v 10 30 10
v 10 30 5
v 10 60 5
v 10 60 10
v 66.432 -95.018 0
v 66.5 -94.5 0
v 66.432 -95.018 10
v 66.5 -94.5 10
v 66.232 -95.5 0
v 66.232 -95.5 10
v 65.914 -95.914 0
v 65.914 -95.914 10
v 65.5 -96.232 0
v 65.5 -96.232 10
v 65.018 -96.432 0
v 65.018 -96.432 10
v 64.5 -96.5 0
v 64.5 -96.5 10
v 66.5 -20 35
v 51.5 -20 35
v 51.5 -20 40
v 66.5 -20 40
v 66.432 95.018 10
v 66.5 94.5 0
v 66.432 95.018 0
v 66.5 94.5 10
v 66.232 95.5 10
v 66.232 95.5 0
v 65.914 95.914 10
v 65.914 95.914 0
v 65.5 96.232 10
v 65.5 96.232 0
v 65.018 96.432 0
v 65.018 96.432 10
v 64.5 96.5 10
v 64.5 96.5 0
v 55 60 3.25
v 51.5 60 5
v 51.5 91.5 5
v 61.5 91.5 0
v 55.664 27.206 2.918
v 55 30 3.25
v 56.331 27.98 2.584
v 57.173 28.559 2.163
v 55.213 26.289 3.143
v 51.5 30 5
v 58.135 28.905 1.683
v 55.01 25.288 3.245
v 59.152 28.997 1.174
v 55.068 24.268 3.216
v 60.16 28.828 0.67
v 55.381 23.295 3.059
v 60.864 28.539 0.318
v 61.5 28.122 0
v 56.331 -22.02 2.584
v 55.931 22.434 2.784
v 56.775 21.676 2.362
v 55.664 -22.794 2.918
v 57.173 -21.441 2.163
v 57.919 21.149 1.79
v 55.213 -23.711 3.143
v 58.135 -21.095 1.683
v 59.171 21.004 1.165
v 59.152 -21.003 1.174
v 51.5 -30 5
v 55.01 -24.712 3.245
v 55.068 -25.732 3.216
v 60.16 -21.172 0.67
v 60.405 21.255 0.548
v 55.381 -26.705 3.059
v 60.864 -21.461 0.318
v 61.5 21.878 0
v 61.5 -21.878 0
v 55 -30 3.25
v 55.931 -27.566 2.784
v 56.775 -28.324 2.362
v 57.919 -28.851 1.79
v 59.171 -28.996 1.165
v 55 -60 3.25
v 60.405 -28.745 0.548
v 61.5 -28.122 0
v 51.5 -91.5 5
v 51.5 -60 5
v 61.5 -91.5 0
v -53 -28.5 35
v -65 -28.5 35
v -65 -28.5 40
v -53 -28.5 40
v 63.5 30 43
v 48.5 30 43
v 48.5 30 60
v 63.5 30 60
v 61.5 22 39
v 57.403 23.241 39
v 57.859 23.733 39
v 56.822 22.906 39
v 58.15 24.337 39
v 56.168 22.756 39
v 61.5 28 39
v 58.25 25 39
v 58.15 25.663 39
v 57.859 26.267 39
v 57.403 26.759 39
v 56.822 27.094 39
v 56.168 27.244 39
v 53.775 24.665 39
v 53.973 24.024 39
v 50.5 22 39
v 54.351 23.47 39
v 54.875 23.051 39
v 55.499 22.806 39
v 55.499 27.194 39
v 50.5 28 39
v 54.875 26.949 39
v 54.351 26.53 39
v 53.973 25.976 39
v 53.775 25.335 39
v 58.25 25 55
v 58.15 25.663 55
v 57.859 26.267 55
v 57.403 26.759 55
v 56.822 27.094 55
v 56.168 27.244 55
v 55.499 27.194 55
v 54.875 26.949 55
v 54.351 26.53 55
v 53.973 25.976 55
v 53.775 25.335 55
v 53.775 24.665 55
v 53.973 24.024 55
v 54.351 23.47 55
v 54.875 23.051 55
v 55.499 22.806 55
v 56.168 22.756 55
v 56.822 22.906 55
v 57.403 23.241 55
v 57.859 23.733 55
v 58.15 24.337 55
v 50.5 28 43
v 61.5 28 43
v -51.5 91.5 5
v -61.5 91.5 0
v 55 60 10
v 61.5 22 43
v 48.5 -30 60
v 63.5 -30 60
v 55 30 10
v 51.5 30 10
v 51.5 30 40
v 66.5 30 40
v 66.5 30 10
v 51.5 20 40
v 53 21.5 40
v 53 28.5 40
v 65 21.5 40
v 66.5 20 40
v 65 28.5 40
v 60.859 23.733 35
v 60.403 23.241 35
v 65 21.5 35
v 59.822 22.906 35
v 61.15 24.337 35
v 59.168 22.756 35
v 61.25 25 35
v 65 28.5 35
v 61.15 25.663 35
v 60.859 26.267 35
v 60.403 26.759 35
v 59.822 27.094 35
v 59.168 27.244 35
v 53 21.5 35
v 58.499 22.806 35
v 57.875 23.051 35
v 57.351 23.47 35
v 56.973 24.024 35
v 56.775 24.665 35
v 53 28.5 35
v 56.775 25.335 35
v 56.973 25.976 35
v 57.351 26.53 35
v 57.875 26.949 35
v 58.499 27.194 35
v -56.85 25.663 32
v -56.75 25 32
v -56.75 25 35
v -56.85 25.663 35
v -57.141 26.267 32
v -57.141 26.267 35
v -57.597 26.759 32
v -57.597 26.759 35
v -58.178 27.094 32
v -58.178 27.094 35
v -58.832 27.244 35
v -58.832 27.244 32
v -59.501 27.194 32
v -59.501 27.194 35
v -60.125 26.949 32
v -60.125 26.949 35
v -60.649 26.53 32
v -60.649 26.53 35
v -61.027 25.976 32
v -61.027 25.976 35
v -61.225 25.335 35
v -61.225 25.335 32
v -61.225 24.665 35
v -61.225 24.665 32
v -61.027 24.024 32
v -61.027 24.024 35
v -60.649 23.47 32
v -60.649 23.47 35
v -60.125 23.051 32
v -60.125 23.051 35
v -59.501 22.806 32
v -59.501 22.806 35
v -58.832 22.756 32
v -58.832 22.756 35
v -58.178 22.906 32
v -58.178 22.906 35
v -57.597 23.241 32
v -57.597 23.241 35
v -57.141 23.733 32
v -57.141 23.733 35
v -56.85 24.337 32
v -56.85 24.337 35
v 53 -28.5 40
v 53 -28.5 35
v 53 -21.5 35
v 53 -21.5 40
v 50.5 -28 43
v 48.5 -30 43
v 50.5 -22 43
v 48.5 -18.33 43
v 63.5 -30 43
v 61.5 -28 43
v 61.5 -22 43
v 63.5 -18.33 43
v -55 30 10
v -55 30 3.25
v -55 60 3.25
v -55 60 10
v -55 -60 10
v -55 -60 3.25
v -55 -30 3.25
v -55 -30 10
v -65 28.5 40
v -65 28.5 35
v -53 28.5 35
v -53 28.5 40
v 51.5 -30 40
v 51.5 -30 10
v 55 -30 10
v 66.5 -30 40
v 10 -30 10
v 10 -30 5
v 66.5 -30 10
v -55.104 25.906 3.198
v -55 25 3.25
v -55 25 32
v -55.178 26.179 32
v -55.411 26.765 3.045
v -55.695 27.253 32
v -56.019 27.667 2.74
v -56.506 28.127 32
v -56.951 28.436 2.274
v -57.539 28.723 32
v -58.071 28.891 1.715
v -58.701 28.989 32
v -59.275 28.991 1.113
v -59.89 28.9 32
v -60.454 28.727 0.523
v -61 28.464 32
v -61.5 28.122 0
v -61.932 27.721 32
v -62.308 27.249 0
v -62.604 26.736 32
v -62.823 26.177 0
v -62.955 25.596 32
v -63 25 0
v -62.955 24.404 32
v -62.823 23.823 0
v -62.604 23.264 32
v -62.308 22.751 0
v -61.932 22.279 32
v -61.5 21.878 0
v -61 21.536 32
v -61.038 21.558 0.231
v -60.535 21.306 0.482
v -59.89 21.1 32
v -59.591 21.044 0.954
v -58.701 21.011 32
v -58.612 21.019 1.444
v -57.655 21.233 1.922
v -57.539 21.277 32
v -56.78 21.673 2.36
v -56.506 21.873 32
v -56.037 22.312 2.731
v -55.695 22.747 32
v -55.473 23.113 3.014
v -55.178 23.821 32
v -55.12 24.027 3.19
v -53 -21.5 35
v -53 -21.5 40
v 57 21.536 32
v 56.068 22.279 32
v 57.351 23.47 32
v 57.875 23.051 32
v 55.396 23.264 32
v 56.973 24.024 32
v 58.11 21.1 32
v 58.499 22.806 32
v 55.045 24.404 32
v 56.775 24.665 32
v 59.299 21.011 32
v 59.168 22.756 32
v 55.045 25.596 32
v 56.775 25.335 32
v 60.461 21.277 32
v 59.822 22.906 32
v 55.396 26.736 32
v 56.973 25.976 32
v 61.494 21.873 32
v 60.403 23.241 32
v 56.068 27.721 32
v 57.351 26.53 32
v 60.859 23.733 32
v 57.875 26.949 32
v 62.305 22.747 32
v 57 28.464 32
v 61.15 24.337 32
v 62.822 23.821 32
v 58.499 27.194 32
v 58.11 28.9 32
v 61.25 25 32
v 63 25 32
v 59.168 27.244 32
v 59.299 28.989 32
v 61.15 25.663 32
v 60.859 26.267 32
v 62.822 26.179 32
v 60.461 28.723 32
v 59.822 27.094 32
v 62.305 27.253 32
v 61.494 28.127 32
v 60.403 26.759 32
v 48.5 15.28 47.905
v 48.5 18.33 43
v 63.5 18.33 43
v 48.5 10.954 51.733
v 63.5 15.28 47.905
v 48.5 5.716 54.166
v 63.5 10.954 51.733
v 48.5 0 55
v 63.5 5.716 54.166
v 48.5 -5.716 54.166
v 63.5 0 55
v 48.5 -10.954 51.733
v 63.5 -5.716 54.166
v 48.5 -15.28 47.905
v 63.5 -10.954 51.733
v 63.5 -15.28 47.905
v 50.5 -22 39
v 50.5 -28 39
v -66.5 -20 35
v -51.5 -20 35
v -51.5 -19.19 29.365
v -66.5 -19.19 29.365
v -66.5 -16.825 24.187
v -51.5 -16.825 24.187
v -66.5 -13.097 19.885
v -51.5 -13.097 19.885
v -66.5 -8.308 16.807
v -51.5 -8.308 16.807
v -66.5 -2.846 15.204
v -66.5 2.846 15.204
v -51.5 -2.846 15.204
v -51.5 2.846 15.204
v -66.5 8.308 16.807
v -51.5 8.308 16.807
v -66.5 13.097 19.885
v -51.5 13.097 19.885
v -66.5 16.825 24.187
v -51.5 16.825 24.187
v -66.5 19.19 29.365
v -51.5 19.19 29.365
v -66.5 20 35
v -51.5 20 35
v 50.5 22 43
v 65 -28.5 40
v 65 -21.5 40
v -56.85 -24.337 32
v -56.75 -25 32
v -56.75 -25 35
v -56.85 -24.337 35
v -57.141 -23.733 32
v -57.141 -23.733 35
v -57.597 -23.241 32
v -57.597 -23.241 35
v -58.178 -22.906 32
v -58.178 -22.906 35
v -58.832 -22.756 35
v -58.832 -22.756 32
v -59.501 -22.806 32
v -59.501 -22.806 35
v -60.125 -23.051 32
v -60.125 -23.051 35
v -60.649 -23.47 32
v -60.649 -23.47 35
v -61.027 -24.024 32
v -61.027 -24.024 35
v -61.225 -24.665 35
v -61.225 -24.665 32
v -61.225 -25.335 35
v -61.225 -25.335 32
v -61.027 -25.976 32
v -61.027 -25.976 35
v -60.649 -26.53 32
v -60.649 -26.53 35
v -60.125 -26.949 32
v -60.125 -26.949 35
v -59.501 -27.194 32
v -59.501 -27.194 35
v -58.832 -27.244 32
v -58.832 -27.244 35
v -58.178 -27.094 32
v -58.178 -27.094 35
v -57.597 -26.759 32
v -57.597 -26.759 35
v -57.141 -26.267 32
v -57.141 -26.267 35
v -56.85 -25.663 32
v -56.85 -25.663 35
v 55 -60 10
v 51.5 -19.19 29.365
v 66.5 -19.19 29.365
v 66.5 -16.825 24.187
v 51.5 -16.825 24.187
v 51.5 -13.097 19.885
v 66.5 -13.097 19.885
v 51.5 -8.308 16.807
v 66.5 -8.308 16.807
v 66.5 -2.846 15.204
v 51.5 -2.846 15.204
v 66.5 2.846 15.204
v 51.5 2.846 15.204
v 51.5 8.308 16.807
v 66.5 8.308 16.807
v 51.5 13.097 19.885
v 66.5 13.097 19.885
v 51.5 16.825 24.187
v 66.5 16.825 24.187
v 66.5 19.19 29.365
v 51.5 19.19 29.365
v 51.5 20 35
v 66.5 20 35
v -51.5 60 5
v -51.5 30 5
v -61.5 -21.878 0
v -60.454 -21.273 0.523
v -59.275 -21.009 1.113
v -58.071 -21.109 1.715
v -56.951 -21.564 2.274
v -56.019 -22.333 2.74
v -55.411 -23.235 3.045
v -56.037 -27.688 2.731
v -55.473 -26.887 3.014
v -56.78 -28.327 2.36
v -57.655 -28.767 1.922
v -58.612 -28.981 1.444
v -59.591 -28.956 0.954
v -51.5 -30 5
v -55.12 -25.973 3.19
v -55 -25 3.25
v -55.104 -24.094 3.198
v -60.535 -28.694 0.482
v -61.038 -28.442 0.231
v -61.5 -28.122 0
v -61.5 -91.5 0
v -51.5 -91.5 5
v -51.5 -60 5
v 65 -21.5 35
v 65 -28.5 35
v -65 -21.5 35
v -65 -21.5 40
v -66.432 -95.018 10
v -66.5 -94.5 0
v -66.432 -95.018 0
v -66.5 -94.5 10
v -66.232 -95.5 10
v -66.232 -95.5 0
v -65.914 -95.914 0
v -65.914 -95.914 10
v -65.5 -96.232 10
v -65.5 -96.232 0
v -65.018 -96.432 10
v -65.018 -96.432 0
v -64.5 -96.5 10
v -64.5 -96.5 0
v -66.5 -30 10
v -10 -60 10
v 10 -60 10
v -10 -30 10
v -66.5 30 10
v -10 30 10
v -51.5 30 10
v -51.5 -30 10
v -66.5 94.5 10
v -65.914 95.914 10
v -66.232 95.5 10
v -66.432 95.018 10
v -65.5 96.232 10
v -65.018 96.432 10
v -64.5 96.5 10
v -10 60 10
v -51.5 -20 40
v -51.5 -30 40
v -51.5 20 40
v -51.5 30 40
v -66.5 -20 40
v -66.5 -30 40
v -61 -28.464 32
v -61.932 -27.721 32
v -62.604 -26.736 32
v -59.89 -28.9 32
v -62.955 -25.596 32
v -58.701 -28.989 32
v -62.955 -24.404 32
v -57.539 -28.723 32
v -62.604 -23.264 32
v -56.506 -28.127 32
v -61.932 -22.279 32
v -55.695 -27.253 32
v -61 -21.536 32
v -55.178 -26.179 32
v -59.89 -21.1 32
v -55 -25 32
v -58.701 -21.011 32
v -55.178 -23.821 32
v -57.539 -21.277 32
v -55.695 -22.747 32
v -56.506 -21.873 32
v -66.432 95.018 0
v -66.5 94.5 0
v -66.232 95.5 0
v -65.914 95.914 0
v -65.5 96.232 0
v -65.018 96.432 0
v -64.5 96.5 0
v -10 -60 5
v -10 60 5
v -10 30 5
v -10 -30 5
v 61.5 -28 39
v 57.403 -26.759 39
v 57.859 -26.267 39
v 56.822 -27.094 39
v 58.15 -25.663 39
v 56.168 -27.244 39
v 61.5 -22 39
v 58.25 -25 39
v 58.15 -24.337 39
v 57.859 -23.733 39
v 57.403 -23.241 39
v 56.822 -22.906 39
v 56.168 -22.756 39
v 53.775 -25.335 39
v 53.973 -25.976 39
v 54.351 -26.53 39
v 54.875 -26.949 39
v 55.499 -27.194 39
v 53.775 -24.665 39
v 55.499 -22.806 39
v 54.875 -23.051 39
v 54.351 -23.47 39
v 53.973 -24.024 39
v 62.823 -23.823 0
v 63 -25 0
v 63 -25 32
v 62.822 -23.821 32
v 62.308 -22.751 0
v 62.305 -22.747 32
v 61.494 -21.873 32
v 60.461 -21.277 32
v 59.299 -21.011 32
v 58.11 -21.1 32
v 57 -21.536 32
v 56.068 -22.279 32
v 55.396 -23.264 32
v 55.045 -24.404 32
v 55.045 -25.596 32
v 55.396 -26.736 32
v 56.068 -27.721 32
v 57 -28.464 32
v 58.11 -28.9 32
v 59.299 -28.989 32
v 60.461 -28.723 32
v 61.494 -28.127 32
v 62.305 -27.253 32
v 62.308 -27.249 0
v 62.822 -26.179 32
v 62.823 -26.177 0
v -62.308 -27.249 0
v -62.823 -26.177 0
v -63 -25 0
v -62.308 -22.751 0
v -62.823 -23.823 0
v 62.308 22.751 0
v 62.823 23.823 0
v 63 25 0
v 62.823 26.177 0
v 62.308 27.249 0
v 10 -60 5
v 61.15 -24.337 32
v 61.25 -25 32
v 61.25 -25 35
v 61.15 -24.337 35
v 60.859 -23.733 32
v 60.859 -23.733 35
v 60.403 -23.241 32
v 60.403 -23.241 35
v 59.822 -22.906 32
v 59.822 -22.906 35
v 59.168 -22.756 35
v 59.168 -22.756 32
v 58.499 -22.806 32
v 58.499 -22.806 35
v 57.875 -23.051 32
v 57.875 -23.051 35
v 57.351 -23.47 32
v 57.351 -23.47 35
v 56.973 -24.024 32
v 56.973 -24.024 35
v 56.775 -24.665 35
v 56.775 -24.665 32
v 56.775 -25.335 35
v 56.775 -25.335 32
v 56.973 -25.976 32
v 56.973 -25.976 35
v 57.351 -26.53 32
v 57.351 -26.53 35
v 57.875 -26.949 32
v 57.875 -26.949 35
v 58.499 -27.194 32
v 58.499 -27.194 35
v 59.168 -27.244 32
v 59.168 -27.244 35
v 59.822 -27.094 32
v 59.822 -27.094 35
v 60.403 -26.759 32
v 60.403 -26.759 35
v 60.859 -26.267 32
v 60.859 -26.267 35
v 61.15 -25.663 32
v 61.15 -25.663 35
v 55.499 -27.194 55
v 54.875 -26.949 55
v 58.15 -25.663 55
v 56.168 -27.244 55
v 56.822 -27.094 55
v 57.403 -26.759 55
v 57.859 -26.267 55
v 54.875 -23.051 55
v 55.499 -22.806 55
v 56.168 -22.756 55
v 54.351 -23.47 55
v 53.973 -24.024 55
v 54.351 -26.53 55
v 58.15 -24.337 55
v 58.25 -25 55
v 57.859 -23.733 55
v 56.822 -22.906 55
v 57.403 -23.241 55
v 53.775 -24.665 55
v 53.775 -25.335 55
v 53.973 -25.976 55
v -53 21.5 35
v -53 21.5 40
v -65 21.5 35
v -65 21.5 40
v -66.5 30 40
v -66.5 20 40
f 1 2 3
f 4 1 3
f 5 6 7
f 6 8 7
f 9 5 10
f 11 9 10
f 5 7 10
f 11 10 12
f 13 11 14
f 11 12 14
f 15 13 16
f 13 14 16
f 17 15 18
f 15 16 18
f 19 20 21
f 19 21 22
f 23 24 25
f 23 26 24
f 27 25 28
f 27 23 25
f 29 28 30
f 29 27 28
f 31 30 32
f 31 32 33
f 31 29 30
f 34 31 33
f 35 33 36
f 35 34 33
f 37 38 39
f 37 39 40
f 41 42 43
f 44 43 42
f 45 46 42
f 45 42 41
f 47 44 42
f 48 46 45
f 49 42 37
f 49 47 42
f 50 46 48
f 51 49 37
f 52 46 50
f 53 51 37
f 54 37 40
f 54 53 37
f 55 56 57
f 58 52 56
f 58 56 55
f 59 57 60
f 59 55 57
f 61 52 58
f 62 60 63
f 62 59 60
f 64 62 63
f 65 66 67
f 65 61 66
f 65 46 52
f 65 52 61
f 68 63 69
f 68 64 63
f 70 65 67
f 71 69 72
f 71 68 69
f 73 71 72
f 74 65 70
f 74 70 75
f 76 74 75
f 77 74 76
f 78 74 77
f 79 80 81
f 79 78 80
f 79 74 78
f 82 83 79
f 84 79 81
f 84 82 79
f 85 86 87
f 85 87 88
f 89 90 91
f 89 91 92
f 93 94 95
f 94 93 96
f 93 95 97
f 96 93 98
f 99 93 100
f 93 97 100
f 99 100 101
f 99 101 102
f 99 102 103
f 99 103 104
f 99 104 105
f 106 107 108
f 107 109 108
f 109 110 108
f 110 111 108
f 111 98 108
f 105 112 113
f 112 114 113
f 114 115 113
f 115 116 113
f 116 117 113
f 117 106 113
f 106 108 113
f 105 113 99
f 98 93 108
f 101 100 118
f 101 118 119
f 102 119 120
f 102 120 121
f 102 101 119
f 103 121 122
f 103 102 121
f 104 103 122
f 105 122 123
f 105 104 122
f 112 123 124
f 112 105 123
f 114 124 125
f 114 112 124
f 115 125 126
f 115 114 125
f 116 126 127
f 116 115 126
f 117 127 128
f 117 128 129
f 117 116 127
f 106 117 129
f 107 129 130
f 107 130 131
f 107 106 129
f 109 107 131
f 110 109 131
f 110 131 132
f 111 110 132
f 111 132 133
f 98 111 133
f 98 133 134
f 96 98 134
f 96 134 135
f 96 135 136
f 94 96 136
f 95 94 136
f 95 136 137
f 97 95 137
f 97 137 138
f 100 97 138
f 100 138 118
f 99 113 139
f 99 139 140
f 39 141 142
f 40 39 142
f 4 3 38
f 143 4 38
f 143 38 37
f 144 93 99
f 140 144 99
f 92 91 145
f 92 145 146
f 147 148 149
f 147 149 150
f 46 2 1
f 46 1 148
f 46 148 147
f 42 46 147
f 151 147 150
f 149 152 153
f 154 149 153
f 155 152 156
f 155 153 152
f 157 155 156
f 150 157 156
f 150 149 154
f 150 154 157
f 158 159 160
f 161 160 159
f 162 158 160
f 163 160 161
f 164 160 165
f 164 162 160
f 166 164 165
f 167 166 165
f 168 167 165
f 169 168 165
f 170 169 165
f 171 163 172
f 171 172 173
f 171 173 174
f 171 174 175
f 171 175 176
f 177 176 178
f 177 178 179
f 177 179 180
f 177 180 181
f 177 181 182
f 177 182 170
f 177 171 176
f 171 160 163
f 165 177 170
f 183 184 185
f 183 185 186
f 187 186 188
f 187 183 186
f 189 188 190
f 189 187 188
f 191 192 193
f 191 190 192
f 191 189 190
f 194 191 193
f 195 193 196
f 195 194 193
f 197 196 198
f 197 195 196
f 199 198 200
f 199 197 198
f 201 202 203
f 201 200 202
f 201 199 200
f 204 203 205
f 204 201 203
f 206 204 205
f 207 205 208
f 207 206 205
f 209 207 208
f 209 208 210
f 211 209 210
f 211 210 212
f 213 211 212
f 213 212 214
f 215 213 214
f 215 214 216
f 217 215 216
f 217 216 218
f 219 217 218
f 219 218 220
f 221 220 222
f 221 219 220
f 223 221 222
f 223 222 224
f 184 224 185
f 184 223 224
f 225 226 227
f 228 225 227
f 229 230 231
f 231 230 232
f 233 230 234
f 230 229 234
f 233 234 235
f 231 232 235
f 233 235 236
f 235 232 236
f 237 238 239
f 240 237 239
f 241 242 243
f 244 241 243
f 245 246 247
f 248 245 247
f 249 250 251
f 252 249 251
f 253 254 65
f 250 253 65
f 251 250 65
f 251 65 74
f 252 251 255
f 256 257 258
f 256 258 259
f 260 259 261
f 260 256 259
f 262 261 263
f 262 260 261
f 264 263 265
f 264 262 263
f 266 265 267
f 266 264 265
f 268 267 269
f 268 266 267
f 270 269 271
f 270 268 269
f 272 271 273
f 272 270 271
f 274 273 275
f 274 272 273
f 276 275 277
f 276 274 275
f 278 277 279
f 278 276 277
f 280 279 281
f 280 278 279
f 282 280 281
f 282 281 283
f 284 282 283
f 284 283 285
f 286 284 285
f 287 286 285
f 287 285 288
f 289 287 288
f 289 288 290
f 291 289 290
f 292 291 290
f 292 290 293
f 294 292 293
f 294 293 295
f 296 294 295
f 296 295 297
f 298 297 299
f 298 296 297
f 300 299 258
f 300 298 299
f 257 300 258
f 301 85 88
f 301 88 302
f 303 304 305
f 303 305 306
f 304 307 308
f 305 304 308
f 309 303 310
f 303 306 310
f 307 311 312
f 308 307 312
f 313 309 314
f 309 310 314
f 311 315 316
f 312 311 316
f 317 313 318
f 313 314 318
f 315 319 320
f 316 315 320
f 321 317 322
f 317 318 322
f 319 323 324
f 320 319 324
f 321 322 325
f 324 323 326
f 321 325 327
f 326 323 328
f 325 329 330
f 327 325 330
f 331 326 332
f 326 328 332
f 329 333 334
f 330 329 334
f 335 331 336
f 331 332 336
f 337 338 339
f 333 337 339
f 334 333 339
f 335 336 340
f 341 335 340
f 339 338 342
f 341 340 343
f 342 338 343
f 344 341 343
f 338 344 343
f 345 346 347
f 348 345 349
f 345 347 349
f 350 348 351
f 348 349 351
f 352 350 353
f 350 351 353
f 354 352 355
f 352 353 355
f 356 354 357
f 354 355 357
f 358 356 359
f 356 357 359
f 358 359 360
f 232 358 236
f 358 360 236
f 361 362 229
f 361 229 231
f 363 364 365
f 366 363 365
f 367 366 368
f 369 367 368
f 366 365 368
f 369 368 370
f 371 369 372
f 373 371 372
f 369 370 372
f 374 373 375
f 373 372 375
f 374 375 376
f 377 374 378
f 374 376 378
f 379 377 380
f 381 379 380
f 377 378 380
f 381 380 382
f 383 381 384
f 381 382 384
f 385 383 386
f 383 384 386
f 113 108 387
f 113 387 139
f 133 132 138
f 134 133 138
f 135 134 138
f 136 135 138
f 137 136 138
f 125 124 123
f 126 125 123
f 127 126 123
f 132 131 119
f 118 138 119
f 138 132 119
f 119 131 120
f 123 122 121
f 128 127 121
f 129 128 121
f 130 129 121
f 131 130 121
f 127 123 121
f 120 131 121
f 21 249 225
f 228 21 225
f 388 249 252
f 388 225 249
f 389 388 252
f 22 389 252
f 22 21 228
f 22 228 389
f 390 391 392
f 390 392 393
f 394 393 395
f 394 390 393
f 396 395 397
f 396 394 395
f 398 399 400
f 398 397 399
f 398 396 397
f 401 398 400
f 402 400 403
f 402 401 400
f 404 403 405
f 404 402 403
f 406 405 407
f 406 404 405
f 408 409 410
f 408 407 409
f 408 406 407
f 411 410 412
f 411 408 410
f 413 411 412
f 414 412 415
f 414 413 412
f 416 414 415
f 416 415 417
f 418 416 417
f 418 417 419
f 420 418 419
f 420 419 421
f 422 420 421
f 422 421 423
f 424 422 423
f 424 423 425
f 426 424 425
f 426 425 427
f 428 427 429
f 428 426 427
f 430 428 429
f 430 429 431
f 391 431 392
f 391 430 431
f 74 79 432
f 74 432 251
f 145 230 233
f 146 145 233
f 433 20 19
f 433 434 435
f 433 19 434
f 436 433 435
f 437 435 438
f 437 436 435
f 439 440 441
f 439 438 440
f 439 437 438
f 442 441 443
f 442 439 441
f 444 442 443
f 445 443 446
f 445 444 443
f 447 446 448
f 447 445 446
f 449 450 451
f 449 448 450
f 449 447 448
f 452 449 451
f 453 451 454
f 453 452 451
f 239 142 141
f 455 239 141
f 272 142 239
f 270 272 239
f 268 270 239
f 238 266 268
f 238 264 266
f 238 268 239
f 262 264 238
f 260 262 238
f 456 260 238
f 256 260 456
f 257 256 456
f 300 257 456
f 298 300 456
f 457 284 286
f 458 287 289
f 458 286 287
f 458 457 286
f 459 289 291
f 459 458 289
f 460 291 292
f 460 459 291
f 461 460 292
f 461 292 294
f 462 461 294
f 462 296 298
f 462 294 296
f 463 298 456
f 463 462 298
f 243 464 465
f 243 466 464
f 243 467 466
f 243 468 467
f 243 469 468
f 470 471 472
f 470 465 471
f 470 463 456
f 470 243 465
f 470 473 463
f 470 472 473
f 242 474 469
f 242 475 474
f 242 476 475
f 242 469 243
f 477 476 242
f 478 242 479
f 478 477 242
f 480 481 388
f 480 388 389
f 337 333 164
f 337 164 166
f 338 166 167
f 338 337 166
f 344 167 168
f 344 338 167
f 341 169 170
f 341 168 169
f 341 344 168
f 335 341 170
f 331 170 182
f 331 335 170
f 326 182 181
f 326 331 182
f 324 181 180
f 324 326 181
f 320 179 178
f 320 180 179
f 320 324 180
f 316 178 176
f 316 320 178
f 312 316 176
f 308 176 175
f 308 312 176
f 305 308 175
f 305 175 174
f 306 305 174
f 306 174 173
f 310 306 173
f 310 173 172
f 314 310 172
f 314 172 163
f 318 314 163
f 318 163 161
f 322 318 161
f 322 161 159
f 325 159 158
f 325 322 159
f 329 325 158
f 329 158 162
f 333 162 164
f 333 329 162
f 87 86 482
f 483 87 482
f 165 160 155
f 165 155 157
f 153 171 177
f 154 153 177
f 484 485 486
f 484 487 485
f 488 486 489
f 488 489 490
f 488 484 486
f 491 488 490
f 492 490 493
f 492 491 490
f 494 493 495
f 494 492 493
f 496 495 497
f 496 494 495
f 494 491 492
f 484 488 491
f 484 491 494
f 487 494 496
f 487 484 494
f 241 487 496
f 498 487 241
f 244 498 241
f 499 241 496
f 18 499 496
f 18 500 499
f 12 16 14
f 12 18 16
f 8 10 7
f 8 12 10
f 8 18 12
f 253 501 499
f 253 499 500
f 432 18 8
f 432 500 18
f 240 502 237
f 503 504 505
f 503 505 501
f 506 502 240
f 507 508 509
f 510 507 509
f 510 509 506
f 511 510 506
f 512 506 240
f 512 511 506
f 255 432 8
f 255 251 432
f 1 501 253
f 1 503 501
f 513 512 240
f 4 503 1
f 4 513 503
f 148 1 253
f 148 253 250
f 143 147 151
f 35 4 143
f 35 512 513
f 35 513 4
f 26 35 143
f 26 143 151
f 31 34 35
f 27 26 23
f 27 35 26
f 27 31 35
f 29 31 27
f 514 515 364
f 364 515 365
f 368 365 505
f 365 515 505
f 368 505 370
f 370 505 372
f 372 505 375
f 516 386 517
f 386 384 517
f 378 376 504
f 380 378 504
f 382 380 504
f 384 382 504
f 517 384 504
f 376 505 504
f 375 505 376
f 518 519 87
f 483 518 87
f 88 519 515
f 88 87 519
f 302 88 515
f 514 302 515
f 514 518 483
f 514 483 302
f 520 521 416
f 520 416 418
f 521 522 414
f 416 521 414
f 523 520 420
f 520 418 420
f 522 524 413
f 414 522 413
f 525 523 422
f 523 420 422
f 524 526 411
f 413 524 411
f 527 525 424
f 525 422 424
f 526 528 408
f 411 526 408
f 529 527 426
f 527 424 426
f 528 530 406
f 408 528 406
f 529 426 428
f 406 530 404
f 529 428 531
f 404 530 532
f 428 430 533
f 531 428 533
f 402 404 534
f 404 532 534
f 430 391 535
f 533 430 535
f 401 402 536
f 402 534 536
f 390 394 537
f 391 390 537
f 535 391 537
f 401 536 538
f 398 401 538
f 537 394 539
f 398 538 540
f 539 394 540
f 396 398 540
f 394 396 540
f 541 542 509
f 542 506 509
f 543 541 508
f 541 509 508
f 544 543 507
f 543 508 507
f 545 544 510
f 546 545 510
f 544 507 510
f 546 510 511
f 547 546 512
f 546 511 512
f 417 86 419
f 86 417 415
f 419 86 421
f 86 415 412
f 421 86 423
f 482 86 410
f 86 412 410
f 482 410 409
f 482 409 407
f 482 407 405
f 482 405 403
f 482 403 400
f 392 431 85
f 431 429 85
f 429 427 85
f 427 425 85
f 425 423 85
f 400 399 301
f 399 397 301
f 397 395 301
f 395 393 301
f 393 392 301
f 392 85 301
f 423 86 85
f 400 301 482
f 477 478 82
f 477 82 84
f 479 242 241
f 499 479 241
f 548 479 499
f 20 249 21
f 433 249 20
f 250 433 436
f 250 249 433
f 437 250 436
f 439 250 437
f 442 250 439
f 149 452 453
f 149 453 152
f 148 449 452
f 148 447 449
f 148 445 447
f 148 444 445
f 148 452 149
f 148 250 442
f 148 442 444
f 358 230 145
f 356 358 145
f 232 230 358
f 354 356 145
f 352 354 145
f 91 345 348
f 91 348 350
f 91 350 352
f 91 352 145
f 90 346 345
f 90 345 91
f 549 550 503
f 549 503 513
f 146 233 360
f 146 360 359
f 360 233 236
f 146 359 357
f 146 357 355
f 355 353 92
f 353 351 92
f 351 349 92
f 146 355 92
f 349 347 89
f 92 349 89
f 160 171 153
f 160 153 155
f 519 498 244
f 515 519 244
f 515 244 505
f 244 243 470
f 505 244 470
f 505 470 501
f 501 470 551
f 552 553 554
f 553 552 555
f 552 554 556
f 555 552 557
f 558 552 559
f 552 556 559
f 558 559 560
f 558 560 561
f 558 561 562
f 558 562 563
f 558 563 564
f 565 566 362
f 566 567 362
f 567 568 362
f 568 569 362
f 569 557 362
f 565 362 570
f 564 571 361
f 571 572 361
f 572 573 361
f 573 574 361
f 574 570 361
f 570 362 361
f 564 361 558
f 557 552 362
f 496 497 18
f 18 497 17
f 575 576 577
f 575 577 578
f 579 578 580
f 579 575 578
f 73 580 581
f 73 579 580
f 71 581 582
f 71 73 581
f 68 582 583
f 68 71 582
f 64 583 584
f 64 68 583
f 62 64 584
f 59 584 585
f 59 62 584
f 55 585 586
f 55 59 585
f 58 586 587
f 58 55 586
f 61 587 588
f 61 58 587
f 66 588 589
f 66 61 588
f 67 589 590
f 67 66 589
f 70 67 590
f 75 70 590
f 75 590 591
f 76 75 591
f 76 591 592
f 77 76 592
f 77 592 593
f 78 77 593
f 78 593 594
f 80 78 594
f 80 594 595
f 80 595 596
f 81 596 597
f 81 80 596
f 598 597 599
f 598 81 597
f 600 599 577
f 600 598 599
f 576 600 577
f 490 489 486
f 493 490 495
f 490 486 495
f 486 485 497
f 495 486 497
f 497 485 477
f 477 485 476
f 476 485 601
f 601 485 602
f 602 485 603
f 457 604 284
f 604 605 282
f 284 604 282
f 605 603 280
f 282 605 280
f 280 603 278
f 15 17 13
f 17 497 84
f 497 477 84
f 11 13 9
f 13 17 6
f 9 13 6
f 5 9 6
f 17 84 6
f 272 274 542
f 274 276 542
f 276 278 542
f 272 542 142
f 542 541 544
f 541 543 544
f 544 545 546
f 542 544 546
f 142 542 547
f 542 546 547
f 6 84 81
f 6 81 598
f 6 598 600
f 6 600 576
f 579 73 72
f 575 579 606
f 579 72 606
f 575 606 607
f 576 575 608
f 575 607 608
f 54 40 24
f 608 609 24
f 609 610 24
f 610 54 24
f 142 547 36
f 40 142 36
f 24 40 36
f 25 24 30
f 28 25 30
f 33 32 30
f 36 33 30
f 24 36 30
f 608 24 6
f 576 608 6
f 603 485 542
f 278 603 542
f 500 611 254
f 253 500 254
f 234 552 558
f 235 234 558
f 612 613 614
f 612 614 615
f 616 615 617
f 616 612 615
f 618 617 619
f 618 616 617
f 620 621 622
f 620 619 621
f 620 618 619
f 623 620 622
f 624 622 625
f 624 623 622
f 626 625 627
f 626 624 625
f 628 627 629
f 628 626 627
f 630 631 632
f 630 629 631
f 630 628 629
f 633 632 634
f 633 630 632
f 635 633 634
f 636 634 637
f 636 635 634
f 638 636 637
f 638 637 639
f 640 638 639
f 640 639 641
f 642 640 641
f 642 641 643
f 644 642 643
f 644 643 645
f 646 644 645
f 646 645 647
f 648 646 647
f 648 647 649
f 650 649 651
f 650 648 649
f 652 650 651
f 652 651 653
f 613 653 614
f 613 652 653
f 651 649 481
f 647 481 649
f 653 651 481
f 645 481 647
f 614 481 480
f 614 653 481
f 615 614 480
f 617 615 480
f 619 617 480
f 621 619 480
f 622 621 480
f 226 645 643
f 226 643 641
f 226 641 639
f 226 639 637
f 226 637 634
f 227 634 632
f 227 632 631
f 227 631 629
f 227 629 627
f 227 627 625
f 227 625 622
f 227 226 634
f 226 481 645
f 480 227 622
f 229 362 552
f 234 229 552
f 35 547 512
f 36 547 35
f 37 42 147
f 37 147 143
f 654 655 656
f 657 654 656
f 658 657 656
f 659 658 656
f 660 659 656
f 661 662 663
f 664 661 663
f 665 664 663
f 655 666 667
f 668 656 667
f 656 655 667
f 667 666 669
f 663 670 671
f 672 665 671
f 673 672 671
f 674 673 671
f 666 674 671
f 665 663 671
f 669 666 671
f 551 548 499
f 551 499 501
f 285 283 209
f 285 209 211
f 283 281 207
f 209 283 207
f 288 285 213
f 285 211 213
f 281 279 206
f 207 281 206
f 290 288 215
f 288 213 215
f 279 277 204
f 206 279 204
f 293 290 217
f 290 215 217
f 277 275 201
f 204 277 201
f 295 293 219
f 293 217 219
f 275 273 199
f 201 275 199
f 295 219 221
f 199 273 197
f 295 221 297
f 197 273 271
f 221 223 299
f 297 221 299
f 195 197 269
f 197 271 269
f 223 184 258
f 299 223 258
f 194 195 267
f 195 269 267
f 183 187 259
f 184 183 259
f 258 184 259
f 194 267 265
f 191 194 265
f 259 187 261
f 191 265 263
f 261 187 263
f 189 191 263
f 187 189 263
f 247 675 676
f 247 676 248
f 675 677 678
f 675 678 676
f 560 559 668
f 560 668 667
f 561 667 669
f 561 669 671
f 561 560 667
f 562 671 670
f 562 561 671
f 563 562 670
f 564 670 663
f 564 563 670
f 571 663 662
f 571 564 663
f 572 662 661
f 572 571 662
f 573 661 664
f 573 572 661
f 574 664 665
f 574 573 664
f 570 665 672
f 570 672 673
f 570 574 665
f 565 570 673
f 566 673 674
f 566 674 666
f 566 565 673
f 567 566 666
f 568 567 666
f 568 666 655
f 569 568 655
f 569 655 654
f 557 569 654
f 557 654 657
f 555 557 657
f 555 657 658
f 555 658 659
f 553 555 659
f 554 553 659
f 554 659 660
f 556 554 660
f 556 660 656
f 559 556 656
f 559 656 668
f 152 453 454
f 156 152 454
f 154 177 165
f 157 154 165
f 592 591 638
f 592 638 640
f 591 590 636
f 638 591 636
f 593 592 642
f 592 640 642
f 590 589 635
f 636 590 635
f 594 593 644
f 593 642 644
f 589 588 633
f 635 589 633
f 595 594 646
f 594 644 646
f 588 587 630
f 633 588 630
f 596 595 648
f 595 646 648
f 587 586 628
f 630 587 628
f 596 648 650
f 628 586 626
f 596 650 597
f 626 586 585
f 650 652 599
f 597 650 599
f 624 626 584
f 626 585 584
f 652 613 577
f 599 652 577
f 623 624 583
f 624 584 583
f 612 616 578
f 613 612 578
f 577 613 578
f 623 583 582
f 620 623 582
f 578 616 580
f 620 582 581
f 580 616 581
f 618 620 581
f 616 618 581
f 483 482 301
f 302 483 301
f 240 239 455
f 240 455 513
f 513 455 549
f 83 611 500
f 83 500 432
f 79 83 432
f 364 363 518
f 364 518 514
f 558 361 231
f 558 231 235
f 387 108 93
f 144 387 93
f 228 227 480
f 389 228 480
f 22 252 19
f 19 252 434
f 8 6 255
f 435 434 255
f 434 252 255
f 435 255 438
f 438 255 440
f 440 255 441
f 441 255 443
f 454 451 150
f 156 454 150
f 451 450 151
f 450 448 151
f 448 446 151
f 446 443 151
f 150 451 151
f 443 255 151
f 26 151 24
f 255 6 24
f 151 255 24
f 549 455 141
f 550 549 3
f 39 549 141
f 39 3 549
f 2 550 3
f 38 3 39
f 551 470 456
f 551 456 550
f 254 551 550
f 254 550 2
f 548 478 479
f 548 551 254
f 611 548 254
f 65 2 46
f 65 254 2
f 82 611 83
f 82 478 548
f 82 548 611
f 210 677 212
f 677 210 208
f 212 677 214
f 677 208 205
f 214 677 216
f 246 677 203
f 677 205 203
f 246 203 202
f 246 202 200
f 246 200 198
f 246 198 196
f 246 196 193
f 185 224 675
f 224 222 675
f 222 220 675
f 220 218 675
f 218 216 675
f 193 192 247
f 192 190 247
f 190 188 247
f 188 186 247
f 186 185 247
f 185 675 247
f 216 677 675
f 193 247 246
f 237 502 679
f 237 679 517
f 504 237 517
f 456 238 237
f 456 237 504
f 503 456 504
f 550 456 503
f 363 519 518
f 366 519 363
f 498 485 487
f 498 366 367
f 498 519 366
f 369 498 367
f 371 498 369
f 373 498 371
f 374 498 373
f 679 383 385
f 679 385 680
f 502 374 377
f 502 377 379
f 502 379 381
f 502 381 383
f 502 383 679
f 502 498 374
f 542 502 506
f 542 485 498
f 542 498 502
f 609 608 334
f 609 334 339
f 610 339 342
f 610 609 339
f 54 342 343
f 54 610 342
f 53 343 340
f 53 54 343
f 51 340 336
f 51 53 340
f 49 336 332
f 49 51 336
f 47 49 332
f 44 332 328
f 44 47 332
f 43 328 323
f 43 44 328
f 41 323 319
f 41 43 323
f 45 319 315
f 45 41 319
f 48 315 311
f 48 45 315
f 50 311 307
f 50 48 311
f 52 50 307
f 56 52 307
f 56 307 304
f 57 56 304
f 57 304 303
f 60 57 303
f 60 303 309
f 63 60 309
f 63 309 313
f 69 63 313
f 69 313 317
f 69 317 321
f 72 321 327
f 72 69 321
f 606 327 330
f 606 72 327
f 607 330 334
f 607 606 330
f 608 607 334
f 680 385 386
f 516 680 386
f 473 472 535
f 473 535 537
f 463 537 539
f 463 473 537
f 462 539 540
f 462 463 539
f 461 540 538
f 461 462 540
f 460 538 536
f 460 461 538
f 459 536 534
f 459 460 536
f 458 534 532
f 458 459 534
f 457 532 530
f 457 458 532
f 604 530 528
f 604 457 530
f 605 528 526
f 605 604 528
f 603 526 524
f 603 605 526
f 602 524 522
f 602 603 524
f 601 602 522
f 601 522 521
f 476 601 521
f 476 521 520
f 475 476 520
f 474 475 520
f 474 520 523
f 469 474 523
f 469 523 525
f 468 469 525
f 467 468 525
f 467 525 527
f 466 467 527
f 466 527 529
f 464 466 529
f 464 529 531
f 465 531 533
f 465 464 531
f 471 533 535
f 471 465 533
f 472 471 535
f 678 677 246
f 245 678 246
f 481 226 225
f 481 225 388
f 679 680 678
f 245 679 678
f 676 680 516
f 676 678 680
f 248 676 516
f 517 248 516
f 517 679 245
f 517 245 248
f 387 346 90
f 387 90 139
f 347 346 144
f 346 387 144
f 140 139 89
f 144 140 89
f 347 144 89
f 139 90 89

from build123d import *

# Parameters (mm, degrees)
SKETCH_W             = 133
SKETCH_H             = 193
PAD_DEPTH            = 10
SKETCH001_W          = 15
SKETCH001_H          = 60
PAD001_DEPTH         = 60
POCKET_DEPTH         = 91.5
SKETCH003_W          = 45
SKETCH003_H          = 30
POCKET001_DEPTH      = 60.001
SKETCH004_R          = 20
POCKET002_DEPTH      = 66.501
POCKET002_DEPTH_BACK = -66.501
SKETCH005_W          = 60
SKETCH005_H          = 60
POCKET003_DEPTH      = 66.501
POCKET003_DEPTH_BACK = -66.501
SKETCH006_R          = 2.25
POCKET004_DEPTH      = 0.001
POCKET004_DEPTH_BACK = -35.001
SKETCH007_R          = 4
POCKET005_DEPTH      = 32
SKETCH008_W          = 15
SKETCH008_H          = 10
SKETCH008_W_2        = 12
SKETCH008_H_2        = 7
PAD002_DEPTH         = 5
FILLET_R             = 2
SKETCH009_W          = 15
SKETCH009_H          = 60
PAD003_DEPTH         = 60
SKETCH010_R          = 20
POCKET006_DEPTH      = 7.501
POCKET006_DEPTH_BACK = -7.501
SKETCH011_W          = 60
SKETCH011_H          = 40
POCKET007_DEPTH      = 7.501
POCKET007_DEPTH_BACK = -7.501
SKETCH012_R          = 2.25
POCKET008_DEPTH      = 55
SKETCH013_W          = 15
SKETCH013_H          = 12
SKETCH013_W_2        = 11
SKETCH013_H_2        = 6
POCKET009_DEPTH      = 43
SKETCH014_W          = 80
SKETCH014_H          = 39
POCKET010_DEPTH      = 7.501
POCKET010_DEPTH_BACK = -7.501


with BuildPart() as body:
    # Sketch → Pad (new body)
    with BuildSketch(Plane.XY):
        Rectangle(SKETCH_W, SKETCH_H)
    extrude(amount=PAD_DEPTH)

    # Sketch001 → Pad001 (join)
    with BuildSketch(Plane.XY):
        with Locations((59, 0)):
            Rectangle(SKETCH001_W, SKETCH001_H)
        with Locations((-59, 0)):
            Rectangle(SKETCH001_W, SKETCH001_H)
    extrude(amount=PAD001_DEPTH)

    # Sketch002 → Pocket (cut, symmetric)
    with BuildSketch(Plane.XZ):
        Polygon((-51.5, 5), (51.5, 5), (61.5, 0), (0, 0), (-61.5, 0), align=None)
    extrude(amount=POCKET_DEPTH, both=True, mode=Mode.SUBTRACT)

    # Sketch003 → Pocket001 (cut, through all)
    with BuildSketch(Plane.XY):
        with Locations((-32.5, 45)):
            Rectangle(SKETCH003_W, SKETCH003_H)
        with Locations((32.5, 45)):
            Rectangle(SKETCH003_W, SKETCH003_H)
        with Locations((32.5, -45)):
            Rectangle(SKETCH003_W, SKETCH003_H)
        with Locations((-32.5, -45)):
            Rectangle(SKETCH003_W, SKETCH003_H)
    extrude(amount=POCKET001_DEPTH, mode=Mode.SUBTRACT)

    # Sketch004 → Pocket002 (cut, two sides)
    with BuildSketch(Plane.YZ) as pocket002_sk:
        with Locations((0, 35)):
            Circle(SKETCH004_R)
    extrude(amount=-POCKET002_DEPTH, mode=Mode.SUBTRACT)
    extrude(pocket002_sk.sketch, amount=-POCKET002_DEPTH_BACK, mode=Mode.SUBTRACT)

    # Sketch005 → Pocket003 (cut, two sides)
    with BuildSketch(Plane.YZ) as pocket003_sk:
        with Locations((0, 65)):
            Rectangle(SKETCH005_W, SKETCH005_H)
    extrude(amount=-POCKET003_DEPTH, mode=Mode.SUBTRACT)
    extrude(pocket003_sk.sketch, amount=-POCKET003_DEPTH_BACK, mode=Mode.SUBTRACT)

    # Sketch006 → Pocket004 (cut, two sides)
    with BuildSketch(Plane.XY) as pocket004_sk:
        with Locations((-59, 25)):
            Circle(SKETCH006_R)
        with Locations((59, 25)):
            Circle(SKETCH006_R)
        with Locations((59, -25)):
            Circle(SKETCH006_R)
        with Locations((-59, -25)):
            Circle(SKETCH006_R)
    extrude(amount=-POCKET004_DEPTH, mode=Mode.SUBTRACT)
    extrude(pocket004_sk.sketch, amount=-POCKET004_DEPTH_BACK, mode=Mode.SUBTRACT)

    # Sketch007 → Pocket005 (cut)
    with BuildSketch(Plane.XY):
        with Locations((-59, 25)):
            Circle(SKETCH007_R)
        with Locations((59, 25)):
            Circle(SKETCH007_R)
        with Locations((59, -25)):
            Circle(SKETCH007_R)
        with Locations((-59, -25)):
            Circle(SKETCH007_R)
    extrude(amount=POCKET005_DEPTH, mode=Mode.SUBTRACT)

    # Sketch008 (on Face50 of Pocket005) → Pad002 (join)
    with BuildSketch(Plane.XY.offset(35)):
        with Locations((-59, 25)):
            Rectangle(SKETCH008_W, SKETCH008_H)
        with Locations((-59, 25)):
            Rectangle(SKETCH008_W_2, SKETCH008_H_2, mode=Mode.SUBTRACT)
        with Locations((-59, -25)):
            Rectangle(SKETCH008_W, SKETCH008_H)
        with Locations((-59, -25)):
            Rectangle(SKETCH008_W_2, SKETCH008_H_2, mode=Mode.SUBTRACT)
        with Locations((59, -25)):
            Rectangle(SKETCH008_W, SKETCH008_H)
        with Locations((59, -25)):
            Rectangle(SKETCH008_W_2, SKETCH008_H_2, mode=Mode.SUBTRACT)
        with Locations((59, 25)):
            Rectangle(SKETCH008_W, SKETCH008_H)
        with Locations((59, 25)):
            Rectangle(SKETCH008_W_2, SKETCH008_H_2, mode=Mode.SUBTRACT)
    extrude(amount=PAD002_DEPTH)

    # Fillet
    fillet_edges = [body.edges().sort_by_distance(p)[0] for p in [
        (-66.5, 96.5, 5),
        (66.5, 96.5, 5),
        (-66.5, -96.5, 5),
        (66.5, -96.5, 5),
    ]]
    fillet(fillet_edges, radius=FILLET_R)


with BuildPart() as hole_fixer:
    # Sketch009 → Pad003 (new body)
    with BuildSketch(Plane.XY):
        Rectangle(SKETCH009_W, SKETCH009_H)
    extrude(amount=PAD003_DEPTH)

    # Sketch010 → Pocket006 (cut, two sides)
    with BuildSketch(Plane.YZ) as pocket006_sk:
        with Locations((0, 35)):
            Circle(SKETCH010_R)
    extrude(amount=-POCKET006_DEPTH, mode=Mode.SUBTRACT)
    extrude(pocket006_sk.sketch, amount=-POCKET006_DEPTH_BACK, mode=Mode.SUBTRACT)

    # Sketch011 → Pocket007 (cut, two sides)
    with BuildSketch(Plane.YZ) as pocket007_sk:
        with Locations((0, 15)):
            Rectangle(SKETCH011_W, SKETCH011_H)
    extrude(amount=-POCKET007_DEPTH, mode=Mode.SUBTRACT)
    extrude(pocket007_sk.sketch, amount=-POCKET007_DEPTH_BACK, mode=Mode.SUBTRACT)

    # Sketch012 → Pocket008 (cut)
    with BuildSketch(Plane.XY):
        with Locations((0, 25)):
            Circle(SKETCH012_R)
        with Locations((0, -25)):
            Circle(SKETCH012_R)
    extrude(amount=POCKET008_DEPTH, mode=Mode.SUBTRACT)

    # Sketch013 → Pocket009 (cut)
    with BuildSketch(Plane.XY):
        with Locations((0, 24)):
            Rectangle(SKETCH013_W, SKETCH013_H)
        with Locations((0, 25)):
            Rectangle(SKETCH013_W_2, SKETCH013_H_2, mode=Mode.SUBTRACT)
        with Locations((0, -24)):
            Rectangle(SKETCH013_W, SKETCH013_H)
        with Locations((0, -25)):
            Rectangle(SKETCH013_W_2, SKETCH013_H_2, mode=Mode.SUBTRACT)
    extrude(amount=POCKET009_DEPTH, mode=Mode.SUBTRACT)

    # Sketch014 → Pocket010 (cut, two sides)
    with BuildSketch(Plane.YZ) as pocket010_sk:
        with Locations((0, 19.5)):
            Rectangle(SKETCH014_W, SKETCH014_H)
    extrude(amount=-POCKET010_DEPTH, mode=Mode.SUBTRACT)
    extrude(pocket010_sk.sketch, amount=-POCKET010_DEPTH_BACK, mode=Mode.SUBTRACT)


with BuildPart() as hole_fixer_1:
    # Body001 placement: moved
    add(hole_fixer.part.moved(Location((56, 0, 0))))


solid = Compound([body.part, hole_fixer_1.part])
